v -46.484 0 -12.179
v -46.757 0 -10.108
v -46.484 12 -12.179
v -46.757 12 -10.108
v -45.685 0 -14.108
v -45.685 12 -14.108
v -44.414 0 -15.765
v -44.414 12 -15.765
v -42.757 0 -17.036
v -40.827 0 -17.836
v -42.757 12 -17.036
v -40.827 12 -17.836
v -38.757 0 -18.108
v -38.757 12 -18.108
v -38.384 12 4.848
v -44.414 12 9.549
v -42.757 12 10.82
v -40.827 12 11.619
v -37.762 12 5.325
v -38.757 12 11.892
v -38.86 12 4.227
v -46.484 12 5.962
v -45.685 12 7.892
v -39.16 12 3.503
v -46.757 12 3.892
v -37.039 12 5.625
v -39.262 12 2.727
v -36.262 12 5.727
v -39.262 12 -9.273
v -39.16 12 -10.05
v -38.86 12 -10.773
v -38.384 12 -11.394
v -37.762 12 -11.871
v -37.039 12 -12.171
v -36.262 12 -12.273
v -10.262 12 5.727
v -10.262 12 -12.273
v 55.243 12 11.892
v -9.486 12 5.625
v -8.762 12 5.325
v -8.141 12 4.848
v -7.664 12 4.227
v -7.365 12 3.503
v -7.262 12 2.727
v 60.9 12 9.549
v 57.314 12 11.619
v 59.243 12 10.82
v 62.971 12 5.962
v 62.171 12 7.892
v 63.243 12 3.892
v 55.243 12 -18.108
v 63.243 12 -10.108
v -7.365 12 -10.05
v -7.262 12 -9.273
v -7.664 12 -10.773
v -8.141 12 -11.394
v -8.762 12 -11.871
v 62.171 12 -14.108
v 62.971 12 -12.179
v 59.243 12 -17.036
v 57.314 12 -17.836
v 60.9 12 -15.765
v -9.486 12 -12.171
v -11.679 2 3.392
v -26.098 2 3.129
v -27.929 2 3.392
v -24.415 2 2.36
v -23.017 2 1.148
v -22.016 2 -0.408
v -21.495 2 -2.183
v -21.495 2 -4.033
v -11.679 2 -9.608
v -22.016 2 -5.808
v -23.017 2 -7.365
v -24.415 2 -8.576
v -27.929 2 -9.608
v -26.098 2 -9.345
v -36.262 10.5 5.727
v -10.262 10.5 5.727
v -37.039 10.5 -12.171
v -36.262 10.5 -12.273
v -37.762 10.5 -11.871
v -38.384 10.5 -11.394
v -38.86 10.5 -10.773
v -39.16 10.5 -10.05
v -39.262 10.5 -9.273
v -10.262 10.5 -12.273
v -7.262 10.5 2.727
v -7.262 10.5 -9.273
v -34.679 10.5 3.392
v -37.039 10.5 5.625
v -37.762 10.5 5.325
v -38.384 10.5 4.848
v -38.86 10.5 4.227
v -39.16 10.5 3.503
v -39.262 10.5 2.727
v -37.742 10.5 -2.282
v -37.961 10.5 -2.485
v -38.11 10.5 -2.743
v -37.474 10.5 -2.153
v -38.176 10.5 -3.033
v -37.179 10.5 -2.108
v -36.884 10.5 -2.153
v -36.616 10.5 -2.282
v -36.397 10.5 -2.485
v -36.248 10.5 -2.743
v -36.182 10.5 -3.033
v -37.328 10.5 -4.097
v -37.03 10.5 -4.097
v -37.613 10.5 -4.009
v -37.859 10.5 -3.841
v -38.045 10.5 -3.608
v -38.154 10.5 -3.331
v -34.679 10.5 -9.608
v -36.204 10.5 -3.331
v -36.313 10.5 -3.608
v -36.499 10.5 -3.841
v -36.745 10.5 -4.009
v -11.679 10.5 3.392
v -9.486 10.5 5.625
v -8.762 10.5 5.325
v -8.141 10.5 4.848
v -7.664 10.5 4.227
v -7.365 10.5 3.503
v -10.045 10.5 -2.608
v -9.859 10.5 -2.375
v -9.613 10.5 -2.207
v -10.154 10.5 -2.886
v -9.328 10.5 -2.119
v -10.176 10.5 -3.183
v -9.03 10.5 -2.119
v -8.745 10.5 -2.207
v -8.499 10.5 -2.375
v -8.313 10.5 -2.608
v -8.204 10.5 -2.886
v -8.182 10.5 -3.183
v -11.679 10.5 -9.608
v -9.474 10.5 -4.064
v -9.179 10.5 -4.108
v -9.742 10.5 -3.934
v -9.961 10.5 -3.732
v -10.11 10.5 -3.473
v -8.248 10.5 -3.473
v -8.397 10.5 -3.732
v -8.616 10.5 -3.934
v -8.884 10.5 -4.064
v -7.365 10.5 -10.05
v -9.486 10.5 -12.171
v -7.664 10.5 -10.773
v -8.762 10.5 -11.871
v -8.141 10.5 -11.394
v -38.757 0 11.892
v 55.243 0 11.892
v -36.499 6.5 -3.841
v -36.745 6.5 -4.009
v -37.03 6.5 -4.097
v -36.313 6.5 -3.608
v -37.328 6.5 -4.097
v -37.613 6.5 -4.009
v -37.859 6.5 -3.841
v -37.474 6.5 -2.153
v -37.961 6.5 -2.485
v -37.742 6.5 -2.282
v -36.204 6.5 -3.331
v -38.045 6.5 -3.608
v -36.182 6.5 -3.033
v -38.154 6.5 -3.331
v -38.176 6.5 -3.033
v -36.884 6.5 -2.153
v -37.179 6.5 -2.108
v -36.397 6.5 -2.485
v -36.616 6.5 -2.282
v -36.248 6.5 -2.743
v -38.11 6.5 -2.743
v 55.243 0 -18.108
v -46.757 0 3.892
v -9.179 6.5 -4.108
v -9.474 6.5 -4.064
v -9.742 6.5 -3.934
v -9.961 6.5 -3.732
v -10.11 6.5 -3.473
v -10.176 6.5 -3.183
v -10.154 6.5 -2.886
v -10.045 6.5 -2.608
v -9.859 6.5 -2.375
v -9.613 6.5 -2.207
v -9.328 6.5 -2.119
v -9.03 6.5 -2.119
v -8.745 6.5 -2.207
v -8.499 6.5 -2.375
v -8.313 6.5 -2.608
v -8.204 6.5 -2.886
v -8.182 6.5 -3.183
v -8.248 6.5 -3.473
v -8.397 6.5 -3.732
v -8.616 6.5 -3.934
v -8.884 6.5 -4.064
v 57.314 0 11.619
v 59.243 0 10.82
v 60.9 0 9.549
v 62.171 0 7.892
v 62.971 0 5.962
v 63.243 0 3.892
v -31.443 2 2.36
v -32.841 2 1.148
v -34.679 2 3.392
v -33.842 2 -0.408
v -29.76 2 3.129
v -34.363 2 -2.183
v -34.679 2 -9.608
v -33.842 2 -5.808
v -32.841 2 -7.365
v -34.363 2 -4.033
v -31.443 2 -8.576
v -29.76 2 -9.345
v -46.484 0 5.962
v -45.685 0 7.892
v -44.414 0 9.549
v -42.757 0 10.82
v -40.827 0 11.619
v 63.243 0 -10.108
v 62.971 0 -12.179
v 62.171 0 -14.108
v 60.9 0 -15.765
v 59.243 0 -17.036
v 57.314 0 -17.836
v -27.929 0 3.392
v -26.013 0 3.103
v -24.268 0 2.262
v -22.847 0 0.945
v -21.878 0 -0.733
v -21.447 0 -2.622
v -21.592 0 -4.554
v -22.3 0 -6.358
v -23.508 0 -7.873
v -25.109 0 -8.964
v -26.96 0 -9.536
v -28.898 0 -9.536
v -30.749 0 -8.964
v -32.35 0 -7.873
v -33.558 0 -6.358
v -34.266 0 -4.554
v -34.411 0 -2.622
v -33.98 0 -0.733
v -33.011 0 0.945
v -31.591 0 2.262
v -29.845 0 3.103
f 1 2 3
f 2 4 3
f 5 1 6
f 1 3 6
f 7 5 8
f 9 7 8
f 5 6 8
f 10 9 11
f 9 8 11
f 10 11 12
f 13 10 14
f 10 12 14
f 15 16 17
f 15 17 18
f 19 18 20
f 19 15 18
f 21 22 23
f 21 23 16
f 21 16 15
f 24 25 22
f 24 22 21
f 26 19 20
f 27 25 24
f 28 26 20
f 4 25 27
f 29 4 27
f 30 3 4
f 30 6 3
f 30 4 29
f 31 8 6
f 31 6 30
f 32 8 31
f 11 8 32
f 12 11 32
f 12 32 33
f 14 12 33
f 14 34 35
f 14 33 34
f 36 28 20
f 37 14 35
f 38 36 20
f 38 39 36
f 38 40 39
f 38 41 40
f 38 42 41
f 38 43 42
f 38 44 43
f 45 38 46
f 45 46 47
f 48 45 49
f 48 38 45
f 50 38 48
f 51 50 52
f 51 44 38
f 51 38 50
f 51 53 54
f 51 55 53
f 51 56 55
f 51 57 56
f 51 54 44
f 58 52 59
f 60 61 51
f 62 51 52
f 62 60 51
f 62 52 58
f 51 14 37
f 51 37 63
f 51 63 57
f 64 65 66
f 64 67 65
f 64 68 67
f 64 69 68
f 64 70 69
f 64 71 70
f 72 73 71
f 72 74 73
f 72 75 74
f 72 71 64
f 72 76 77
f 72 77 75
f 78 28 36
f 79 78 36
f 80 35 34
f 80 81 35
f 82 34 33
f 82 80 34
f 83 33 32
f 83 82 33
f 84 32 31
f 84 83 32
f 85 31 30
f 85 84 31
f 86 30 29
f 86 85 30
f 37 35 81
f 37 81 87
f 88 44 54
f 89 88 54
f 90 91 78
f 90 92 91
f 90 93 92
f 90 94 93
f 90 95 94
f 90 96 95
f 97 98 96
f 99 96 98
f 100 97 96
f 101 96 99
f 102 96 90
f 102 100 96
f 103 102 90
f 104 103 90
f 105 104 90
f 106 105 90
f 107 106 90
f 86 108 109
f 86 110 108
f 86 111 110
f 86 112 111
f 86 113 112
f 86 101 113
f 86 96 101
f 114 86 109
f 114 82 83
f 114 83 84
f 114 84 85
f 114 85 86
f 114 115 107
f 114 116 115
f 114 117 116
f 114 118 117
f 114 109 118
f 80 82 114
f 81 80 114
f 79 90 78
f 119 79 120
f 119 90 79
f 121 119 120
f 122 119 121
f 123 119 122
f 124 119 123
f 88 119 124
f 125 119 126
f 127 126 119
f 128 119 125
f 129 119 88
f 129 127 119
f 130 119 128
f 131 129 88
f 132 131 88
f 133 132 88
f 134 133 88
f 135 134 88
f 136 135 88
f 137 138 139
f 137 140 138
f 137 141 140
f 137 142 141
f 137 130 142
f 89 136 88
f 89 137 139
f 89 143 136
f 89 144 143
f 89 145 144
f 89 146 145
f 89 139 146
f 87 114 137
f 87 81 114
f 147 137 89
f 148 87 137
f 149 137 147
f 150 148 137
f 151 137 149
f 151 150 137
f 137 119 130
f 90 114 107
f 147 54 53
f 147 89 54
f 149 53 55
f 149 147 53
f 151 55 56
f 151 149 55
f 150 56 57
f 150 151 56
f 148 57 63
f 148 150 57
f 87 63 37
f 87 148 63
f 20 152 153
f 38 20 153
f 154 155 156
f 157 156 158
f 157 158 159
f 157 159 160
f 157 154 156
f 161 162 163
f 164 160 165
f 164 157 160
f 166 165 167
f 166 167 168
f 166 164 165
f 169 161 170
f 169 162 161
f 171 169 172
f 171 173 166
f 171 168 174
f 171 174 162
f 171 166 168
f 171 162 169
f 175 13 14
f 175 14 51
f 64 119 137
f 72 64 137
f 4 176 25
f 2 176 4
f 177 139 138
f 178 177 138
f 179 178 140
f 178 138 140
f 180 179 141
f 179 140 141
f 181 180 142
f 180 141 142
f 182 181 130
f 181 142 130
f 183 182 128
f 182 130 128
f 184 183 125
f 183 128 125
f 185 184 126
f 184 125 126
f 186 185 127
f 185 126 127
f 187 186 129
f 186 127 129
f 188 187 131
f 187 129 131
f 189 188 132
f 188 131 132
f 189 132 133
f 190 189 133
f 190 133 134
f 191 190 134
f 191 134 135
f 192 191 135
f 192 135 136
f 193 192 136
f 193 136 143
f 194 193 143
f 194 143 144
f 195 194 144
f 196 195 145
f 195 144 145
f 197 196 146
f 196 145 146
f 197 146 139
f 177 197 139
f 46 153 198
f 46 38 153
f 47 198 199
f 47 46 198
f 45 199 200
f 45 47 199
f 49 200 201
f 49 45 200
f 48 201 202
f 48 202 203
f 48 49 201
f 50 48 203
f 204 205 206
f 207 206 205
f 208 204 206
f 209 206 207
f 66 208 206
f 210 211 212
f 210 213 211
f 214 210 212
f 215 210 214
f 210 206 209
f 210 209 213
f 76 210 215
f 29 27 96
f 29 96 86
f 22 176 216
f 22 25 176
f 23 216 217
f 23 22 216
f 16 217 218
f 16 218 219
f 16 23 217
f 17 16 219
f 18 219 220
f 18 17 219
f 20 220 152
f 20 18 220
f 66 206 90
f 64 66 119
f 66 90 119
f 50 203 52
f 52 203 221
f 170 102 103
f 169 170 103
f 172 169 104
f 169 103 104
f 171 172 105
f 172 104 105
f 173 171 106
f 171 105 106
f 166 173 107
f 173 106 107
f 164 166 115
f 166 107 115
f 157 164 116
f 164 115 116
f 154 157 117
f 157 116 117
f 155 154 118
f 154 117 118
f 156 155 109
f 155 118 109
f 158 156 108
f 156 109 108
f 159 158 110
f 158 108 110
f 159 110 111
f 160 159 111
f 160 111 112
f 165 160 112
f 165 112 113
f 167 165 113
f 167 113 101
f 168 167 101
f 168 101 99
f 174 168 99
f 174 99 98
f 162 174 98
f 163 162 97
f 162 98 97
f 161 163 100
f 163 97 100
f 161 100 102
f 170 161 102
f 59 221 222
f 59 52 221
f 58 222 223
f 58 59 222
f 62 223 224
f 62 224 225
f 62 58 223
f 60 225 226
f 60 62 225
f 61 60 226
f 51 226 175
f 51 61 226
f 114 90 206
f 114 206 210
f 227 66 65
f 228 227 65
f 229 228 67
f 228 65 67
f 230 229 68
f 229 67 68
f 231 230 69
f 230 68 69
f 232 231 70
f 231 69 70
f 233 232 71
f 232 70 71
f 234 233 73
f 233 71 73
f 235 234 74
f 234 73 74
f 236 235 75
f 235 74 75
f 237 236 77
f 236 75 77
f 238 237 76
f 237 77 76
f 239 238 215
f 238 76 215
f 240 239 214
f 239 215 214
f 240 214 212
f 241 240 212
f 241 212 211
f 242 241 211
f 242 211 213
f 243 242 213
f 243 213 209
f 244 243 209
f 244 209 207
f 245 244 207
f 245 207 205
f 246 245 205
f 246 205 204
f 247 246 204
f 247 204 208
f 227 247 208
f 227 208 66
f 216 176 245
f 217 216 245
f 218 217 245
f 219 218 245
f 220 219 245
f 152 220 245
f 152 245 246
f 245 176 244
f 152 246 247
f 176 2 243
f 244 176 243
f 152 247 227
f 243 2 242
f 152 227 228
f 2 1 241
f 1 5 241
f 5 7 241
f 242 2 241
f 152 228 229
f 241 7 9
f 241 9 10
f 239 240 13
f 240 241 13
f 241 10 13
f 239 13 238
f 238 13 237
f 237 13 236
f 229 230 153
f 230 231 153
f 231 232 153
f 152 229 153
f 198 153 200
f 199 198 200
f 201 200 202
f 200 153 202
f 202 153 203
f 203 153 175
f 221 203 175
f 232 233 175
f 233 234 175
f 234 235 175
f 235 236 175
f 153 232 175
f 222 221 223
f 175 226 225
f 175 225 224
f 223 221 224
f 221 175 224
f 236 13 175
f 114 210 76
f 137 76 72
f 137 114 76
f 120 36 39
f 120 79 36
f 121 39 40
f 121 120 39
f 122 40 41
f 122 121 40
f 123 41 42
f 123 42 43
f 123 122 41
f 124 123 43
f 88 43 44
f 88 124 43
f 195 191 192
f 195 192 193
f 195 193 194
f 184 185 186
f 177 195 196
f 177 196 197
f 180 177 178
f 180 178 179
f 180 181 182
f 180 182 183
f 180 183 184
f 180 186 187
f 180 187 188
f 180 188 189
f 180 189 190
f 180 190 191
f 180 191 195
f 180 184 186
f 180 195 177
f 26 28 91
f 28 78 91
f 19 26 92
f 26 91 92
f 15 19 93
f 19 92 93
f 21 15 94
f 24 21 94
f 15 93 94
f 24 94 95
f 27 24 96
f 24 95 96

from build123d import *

# Parameters (mm, degrees)
SKETCH1_W           = 110
SKETCH1_H           = 30
BOSS_EXTRUDE1_DEPTH = 12
FILLET2_R           = 8
SKETCH4_R           = 6.5
CUT_EXTRUDE1_DEPTH  = 67.870108383
SKETCH3_W           = 23
SKETCH3_H           = 13
CUT_EXTRUDE2_DEPTH  = 10
SKETCH5_W           = 32
SKETCH5_H           = 18
CUT_EXTRUDE3_DEPTH  = 1.5
FILLET4_R           = 3
SKETCH6_R           = 1
CUT_EXTRUDE4_DEPTH  = 4


with BuildPart() as part:
    # Sketch1 → Boss-Extrude1 (new body)
    with BuildSketch(Plane(origin=(0, 0, 0), x_dir=(1, 0, 0), z_dir=(0, 1, 0))):
        with Locations((8.243243243, 3.108108108)):
            Rectangle(SKETCH1_W, SKETCH1_H)
    extrude(amount=BOSS_EXTRUDE1_DEPTH)

    # Fillet2
    fillet2_edges = [part.edges().sort_by_distance(p)[0] for p in [
        (-46.756756757, 6, -18.108108108),
        (63.243243243, 6, -18.108108108),
        (63.243243243, 6, 11.891891892),
        (-46.756756757, 6, 11.891891892),
    ]]
    fillet(fillet2_edges, radius=FILLET2_R)

    # Sketch4 → Cut-Extrude1 (cut, through all)
    with BuildSketch(Plane(origin=(0, 12, 0), x_dir=(1, 0, 0), z_dir=(0, 1, 0))):
        with Locations(Location((-27.929103529, 3.108108108, 0), (0, 0, 270))):
            Circle(SKETCH4_R)
    extrude(amount=-CUT_EXTRUDE1_DEPTH, mode=Mode.SUBTRACT)

    # Sketch3 → Cut-Extrude2 (cut)
    with BuildSketch(Plane(origin=(0, 12, 0), x_dir=(1, 0, 0), z_dir=(0, 1, 0))):
        with Locations((-23.179103529, 3.108108108)):
            Rectangle(SKETCH3_W, SKETCH3_H)
    extrude(amount=-CUT_EXTRUDE2_DEPTH, mode=Mode.SUBTRACT)

    # Sketch5 → Cut-Extrude3 (cut)
    with BuildSketch(Plane(origin=(0, 12, 0), x_dir=(1, 0, 0), z_dir=(0, 1, 0))):
        with Locations((-23.262280593, 3.273133416)):
            Rectangle(SKETCH5_W, SKETCH5_H)
    extrude(amount=-CUT_EXTRUDE3_DEPTH, mode=Mode.SUBTRACT)

    # Fillet4
    fillet4_edges = [part.edges().sort_by_distance(p)[0] for p in [
        (-39.262280593, 11.25, 5.726866584),
        (-39.262280593, 11.25, -12.273133416),
        (-7.262280593, 11.25, -12.273133416),
        (-7.262280593, 11.25, 5.726866584),
    ]]
    fillet(fillet4_edges, radius=FILLET4_R)

    # Sketch6 → Cut-Extrude4 (cut)
    with BuildSketch(Plane(origin=(0, 10.5, 0), x_dir=(1, 0, 0), z_dir=(0, 1, 0))):
        with Locations(Location((-37.179103529, 3.108108108, 0), (0, 0, 270))):
            Circle(SKETCH6_R)
        with Locations(Location((-9.179103529, 3.108108108, 0), (0, 0, 90))):
            Circle(SKETCH6_R)
    extrude(amount=-CUT_EXTRUDE4_DEPTH, mode=Mode.SUBTRACT)


solid = part.part
